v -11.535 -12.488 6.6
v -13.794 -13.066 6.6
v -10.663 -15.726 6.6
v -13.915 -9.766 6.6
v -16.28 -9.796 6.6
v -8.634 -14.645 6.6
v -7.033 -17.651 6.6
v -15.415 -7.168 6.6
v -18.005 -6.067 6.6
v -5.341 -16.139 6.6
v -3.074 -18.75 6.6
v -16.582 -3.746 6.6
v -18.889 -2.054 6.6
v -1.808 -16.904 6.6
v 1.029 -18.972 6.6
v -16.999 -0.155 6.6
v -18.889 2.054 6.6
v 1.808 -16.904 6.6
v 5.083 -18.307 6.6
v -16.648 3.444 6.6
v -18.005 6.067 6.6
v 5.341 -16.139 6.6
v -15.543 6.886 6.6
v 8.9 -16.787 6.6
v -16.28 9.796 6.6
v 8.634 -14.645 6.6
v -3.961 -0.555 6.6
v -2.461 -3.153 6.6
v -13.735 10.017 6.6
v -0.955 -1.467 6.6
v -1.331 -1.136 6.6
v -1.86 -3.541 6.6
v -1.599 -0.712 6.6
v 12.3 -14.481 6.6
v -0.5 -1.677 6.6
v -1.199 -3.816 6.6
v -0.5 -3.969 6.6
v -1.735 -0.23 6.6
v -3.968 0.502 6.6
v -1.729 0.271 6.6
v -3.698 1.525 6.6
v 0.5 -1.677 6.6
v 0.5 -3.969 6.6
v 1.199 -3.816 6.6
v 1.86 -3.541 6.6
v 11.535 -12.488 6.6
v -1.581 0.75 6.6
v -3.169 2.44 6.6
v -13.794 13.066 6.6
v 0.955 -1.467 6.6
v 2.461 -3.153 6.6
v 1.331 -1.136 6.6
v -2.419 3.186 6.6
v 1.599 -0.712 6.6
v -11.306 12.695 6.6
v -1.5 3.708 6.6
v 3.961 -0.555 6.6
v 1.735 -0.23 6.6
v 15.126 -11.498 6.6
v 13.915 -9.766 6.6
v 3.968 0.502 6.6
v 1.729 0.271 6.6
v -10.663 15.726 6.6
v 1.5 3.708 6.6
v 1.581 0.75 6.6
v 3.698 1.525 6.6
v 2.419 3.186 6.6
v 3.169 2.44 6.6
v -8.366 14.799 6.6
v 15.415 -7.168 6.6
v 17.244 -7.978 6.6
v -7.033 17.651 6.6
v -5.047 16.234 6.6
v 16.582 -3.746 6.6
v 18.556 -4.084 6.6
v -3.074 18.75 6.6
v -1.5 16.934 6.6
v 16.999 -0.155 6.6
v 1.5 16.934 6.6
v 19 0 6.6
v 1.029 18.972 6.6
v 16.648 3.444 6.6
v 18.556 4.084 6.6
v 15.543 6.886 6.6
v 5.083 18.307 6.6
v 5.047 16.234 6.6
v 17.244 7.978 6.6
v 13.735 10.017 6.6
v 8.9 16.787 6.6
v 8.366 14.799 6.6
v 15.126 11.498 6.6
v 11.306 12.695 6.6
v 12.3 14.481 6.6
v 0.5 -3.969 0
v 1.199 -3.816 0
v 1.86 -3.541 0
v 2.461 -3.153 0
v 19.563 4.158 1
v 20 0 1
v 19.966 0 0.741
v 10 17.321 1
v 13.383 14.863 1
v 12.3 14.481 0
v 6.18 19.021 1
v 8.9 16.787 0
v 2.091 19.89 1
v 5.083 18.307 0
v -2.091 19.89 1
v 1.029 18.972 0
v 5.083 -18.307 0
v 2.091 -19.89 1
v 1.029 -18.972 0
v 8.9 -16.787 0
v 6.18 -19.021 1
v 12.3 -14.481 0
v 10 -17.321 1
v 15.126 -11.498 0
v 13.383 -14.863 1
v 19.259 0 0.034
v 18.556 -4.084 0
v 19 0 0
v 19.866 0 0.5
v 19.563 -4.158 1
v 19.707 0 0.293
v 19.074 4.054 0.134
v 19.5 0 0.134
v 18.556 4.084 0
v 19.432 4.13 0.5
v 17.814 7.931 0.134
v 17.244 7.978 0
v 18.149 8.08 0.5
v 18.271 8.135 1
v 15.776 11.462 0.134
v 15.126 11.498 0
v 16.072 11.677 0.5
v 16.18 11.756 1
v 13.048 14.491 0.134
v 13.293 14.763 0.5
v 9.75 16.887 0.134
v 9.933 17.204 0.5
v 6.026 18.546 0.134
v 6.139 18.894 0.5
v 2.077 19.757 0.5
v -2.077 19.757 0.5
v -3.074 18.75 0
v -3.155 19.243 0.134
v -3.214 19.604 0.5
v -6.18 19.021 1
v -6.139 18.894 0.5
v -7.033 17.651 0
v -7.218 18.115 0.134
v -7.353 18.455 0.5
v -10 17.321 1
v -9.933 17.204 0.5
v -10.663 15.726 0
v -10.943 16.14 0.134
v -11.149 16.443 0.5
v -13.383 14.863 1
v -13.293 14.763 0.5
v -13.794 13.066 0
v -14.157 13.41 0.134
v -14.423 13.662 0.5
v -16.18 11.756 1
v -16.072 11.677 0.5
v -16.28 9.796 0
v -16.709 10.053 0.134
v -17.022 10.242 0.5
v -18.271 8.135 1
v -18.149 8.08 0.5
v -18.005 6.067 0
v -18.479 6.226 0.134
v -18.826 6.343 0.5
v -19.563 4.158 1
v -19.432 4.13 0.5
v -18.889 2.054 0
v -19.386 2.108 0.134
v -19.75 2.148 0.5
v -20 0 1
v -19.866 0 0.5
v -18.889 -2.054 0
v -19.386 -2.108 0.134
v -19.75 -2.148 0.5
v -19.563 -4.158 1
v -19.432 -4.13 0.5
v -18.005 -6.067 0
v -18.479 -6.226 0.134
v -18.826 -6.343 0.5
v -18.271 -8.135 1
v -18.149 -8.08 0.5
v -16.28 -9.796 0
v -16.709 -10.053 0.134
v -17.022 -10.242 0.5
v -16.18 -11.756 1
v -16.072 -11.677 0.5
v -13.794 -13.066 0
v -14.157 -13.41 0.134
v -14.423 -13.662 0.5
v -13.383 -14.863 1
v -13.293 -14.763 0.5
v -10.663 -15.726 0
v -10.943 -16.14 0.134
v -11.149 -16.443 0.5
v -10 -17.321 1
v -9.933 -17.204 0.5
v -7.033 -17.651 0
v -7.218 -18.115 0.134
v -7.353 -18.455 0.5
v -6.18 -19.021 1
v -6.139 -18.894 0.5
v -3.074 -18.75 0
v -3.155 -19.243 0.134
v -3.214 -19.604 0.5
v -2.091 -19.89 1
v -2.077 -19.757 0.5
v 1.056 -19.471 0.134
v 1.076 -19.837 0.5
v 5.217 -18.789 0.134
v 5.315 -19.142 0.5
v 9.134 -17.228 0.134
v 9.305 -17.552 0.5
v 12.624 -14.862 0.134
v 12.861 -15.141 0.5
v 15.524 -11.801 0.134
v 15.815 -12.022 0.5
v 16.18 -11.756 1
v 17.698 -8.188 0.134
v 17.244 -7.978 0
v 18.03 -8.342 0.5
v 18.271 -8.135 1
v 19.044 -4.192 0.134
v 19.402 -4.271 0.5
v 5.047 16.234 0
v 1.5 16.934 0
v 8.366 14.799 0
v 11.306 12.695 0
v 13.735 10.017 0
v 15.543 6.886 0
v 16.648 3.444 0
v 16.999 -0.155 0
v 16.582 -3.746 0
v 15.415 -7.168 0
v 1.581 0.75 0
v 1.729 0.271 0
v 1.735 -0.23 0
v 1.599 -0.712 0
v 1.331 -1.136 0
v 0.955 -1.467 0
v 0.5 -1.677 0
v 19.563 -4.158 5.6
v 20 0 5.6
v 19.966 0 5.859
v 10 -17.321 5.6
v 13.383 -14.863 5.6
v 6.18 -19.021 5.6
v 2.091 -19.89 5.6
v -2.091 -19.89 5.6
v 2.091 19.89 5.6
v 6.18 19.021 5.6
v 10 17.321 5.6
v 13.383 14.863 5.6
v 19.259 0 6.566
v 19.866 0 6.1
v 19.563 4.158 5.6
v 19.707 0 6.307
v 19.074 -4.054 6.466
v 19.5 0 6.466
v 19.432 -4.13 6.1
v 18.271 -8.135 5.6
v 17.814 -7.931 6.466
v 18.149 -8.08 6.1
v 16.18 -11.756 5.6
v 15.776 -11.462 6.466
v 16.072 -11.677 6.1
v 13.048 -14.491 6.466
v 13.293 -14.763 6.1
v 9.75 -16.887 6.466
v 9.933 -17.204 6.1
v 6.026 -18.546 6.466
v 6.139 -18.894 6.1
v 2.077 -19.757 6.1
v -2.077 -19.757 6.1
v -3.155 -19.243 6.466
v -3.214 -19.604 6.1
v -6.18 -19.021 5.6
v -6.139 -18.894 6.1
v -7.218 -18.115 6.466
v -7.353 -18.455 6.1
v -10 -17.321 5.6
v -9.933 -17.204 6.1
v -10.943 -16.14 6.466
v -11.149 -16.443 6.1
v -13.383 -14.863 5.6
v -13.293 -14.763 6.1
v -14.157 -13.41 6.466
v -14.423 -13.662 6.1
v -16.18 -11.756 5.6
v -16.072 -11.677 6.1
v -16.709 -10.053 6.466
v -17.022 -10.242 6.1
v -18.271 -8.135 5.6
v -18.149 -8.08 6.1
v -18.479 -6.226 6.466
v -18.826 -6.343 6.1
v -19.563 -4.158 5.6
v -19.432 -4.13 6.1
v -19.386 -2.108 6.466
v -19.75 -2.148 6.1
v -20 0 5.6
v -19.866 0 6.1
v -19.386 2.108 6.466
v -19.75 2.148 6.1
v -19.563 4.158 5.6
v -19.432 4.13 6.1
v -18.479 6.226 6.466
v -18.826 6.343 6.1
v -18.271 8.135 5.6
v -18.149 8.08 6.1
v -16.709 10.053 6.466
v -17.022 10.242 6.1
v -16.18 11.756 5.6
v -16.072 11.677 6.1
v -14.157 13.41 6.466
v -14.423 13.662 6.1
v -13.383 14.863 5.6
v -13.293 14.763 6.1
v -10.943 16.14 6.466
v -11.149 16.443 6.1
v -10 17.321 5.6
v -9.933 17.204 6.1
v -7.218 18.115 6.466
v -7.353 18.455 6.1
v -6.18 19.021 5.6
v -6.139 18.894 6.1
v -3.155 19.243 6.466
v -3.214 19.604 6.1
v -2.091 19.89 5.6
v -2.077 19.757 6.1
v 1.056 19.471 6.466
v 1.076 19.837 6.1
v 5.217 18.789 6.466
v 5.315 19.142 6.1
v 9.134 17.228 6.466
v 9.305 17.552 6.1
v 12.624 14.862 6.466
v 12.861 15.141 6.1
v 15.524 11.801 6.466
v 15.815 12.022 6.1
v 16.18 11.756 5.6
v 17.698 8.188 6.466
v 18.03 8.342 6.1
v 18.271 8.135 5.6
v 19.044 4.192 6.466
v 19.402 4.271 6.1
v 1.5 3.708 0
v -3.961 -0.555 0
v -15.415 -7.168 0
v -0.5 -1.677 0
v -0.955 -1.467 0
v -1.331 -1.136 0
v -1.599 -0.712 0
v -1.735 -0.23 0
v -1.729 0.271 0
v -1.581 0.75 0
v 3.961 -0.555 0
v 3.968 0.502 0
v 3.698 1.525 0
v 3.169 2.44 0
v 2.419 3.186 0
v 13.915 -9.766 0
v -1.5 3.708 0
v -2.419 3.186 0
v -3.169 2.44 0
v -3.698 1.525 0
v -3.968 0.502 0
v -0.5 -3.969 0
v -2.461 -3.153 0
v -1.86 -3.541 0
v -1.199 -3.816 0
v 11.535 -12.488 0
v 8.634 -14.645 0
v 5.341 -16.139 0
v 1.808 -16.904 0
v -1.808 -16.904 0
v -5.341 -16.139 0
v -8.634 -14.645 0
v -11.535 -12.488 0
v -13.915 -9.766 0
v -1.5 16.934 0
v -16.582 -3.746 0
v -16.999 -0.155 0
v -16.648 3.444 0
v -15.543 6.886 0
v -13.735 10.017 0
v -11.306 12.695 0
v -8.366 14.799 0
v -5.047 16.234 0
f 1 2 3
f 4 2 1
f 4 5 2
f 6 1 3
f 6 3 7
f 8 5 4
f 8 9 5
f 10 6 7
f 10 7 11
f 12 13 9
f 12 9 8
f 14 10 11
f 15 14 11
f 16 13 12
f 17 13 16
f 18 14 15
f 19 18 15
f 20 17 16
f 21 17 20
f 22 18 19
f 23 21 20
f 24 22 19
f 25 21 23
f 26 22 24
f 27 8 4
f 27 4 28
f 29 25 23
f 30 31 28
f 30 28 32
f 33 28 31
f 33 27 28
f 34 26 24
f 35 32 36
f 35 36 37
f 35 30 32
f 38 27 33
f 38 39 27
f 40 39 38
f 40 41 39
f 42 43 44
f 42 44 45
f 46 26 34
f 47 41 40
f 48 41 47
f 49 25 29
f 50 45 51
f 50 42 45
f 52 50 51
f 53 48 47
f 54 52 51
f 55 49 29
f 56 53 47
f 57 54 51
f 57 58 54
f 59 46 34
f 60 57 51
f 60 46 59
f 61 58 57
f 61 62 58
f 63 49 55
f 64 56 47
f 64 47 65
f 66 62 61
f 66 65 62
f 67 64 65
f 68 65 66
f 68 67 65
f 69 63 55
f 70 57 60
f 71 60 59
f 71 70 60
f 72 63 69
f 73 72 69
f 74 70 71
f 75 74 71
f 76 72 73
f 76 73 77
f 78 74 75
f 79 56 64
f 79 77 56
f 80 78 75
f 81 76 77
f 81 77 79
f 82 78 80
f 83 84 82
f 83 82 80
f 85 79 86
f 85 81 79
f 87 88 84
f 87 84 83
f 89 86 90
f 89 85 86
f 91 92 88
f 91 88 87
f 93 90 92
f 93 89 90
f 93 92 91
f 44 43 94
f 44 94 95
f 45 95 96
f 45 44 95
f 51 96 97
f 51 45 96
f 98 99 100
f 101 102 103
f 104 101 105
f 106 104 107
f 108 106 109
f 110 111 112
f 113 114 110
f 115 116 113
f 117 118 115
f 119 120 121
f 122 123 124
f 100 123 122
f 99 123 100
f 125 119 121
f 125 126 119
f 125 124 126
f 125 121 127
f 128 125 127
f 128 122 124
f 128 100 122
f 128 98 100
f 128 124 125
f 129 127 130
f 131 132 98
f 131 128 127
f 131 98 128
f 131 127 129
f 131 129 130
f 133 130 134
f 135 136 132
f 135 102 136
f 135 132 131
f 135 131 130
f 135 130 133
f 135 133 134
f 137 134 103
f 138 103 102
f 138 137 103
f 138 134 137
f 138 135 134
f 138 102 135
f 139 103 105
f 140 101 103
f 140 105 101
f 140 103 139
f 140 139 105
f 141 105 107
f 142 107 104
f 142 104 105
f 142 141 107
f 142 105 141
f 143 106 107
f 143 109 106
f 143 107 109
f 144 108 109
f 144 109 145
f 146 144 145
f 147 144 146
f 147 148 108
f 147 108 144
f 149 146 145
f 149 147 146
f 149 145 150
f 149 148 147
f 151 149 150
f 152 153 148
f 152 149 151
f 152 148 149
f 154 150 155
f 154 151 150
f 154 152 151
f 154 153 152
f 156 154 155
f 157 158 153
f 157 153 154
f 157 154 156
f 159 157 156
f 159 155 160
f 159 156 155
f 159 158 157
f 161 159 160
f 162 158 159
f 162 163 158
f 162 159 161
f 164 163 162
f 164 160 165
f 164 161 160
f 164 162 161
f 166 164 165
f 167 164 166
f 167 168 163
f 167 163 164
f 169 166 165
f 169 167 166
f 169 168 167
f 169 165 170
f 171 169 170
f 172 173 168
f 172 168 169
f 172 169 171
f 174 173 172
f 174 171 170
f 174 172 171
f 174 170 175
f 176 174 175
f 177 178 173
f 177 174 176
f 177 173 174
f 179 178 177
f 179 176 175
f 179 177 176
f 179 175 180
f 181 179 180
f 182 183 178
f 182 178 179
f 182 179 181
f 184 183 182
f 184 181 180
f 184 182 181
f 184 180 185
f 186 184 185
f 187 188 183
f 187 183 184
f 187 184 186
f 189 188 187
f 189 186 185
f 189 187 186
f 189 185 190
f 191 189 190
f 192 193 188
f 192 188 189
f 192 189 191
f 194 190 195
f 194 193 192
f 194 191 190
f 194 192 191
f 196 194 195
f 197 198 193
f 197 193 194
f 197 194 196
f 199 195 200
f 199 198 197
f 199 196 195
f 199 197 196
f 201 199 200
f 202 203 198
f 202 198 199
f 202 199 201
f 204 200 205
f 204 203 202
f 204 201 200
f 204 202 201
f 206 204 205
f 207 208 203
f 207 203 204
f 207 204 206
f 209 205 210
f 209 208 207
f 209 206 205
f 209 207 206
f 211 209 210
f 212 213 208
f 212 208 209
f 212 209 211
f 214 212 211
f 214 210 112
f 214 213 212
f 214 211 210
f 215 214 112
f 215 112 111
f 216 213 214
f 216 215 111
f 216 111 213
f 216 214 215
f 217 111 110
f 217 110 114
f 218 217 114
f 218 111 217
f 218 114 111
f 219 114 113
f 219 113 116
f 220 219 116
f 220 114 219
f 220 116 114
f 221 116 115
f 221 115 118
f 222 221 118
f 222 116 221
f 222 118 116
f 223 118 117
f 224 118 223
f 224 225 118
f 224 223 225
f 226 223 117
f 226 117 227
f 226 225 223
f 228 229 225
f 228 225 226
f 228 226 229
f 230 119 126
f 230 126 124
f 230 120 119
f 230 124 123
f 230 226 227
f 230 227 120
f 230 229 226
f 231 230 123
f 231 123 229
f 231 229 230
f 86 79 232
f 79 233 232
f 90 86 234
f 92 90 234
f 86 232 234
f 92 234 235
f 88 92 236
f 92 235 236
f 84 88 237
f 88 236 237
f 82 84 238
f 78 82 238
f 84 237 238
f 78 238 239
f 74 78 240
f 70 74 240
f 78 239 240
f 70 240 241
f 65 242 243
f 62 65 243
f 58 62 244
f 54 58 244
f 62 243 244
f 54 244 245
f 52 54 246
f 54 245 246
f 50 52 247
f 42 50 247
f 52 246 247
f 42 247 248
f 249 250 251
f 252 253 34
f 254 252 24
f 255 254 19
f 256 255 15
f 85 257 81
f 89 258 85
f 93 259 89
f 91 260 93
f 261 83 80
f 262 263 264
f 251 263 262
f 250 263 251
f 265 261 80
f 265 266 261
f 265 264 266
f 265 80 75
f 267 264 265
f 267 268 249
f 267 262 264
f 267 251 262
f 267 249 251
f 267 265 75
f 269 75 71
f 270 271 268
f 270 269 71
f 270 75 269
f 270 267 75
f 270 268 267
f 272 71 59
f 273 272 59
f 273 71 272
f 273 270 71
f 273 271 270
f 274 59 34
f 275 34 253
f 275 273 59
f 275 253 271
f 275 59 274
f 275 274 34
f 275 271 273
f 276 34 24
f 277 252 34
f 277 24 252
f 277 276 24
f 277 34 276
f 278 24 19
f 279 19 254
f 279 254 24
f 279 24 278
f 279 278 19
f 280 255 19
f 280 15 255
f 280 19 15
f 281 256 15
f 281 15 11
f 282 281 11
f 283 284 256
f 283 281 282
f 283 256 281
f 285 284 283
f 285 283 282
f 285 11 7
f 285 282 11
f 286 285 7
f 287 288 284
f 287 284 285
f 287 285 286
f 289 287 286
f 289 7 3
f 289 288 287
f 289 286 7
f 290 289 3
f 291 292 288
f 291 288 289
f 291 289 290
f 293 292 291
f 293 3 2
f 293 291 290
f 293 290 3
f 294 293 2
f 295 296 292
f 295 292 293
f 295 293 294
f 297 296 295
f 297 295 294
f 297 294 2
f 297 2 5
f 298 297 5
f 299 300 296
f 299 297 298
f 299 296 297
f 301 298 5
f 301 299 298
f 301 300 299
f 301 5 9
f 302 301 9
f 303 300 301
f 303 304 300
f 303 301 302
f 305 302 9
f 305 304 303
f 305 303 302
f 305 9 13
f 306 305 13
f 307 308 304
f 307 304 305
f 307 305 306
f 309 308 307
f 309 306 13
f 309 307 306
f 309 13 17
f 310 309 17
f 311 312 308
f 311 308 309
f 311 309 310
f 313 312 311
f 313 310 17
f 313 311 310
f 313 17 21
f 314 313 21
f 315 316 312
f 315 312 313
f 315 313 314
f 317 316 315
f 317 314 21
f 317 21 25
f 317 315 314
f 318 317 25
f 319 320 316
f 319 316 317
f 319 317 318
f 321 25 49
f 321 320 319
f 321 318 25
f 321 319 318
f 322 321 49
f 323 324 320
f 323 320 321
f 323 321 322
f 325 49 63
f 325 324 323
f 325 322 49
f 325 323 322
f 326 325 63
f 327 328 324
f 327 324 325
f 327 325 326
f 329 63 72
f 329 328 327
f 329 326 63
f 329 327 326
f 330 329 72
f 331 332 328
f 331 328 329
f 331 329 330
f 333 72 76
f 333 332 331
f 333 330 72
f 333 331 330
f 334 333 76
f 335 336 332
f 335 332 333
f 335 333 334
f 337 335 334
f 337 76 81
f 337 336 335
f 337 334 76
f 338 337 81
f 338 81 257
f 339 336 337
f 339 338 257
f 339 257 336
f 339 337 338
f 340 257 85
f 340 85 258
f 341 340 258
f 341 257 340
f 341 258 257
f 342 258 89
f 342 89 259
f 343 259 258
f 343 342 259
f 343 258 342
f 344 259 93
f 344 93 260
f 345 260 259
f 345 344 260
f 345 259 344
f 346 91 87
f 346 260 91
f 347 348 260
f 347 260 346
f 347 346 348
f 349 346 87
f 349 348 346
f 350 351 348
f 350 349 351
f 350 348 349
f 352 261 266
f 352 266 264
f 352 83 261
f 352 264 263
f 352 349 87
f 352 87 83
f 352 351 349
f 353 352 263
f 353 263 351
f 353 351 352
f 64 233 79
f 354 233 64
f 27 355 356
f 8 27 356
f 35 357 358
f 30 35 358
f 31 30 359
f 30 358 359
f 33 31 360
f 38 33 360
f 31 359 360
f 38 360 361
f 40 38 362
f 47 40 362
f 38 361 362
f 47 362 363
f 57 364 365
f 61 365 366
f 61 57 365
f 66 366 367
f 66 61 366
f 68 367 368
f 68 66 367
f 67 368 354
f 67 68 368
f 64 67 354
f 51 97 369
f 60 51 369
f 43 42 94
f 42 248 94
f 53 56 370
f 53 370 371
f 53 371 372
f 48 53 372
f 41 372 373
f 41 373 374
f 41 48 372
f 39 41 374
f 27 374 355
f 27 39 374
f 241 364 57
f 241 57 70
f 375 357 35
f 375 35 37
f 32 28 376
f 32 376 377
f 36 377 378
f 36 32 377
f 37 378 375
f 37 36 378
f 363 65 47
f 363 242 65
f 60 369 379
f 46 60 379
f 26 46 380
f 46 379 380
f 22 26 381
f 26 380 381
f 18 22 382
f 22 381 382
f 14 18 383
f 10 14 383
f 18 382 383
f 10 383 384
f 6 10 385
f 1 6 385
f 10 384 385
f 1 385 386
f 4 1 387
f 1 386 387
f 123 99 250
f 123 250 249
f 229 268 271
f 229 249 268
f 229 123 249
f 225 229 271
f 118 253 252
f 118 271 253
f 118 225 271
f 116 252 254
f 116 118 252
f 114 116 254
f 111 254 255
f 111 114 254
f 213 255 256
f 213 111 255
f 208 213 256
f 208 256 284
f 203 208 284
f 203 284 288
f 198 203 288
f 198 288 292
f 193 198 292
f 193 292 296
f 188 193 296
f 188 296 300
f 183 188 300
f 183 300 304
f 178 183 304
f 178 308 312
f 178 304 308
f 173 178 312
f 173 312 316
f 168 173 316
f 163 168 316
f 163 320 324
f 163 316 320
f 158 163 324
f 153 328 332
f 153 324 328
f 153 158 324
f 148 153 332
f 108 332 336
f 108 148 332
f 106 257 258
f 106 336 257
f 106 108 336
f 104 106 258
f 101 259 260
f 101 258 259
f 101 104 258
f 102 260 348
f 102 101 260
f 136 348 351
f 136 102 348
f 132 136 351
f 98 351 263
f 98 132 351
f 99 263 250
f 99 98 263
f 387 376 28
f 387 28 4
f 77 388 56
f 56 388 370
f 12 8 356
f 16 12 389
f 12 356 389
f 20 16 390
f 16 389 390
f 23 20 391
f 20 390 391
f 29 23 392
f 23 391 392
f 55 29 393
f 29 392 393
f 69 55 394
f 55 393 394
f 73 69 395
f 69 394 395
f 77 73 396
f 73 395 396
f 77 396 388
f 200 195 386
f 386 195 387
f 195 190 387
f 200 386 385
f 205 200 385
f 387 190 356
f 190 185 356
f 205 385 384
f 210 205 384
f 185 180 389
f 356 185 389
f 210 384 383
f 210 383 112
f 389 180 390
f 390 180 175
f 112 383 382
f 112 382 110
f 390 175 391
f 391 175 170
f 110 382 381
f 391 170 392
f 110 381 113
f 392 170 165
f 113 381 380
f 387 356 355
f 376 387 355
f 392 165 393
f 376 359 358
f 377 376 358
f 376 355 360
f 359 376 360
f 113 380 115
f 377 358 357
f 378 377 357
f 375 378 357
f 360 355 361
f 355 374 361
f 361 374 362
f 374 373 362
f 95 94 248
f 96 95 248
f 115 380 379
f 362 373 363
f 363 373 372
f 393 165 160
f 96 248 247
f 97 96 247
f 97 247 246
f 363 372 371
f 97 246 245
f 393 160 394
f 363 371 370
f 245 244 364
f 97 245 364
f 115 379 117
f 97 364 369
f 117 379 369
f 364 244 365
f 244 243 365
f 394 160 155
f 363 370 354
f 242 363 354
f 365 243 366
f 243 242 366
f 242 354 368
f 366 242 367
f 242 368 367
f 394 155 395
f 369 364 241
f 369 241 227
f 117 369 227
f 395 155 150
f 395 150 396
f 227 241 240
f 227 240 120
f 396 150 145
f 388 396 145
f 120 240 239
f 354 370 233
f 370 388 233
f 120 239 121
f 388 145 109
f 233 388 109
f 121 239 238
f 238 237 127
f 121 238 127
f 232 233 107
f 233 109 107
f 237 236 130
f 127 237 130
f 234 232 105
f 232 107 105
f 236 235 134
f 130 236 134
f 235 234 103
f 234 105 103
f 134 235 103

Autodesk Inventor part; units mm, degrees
ref_plane "YZ Plane" through (0, 0, 0) normal (1, 0, 0) x (0, 1, 0)
ref_plane "XZ Plane" through (0, 0, 0) normal (0, 1, 0) x (-1, 0, 0)
ref_plane "XY Plane" through (0, 0, 0) normal (0, 0, 1) x (1, 0, 0)
sketch "Sketch1" plane through (0, 0, 0) normal (0, 0, 1) x (1, 0, 0)
  circle A0 centre (0, 0) radius 20
  dimension "d0" = 40
extrude "Extrusion1" add sketch "Sketch1" along normal blind 6.6
sketch "Sketch3" plane through (0, 0, 0) normal (0, 0, -1) x (-1, 0, 0)
  circle A0 centre (0, 0) radius 17
  line L0 (0, 17) -> (0, 0)
  line L1 (0, 0) -> (14.7224, -8.5)
  line L2 (0, 0) -> (-14.7224, -8.5)
  line L3 (0, 0) -> (17, 0) construction
  line L4 (1.5, 16.9337) -> (1.5, 0.866)
  line L5 (-1.5, 16.9337) -> (-1.5, 0.866)
  line L6 (-1.5, 0.866) -> (-15.415, -7.1678)
  line L7 (0, -1.7321) -> (-13.915, -9.7659)
  line L8 (1.5, 0.866) -> (15.415, -7.1678)
  line L9 (0, -1.7321) -> (13.915, -9.7659)
  dimension "d6" = 34
  dimension "d7" = 120
  dimension "d8" = 150
  dimension "d9" = 1.5
  dimension "d10" = 1.5
  dimension "d11" = 1.5
  dimension "d12" = 1.5
  dimension "d13" = 1.5
  dimension "d14" = 1.5
extrude "Extrusion3" cut sketch "Sketch3" against normal up to surface (6.6 mm away) contours A0 L8 L4 | L5 L6 A0 | A0 L7 L9
sketch "Sketch5" plane through (0, 0, 6.6) normal (0, 0, 1) x (1, 0, 0)
  circle A0 centre (0, 0) radius 4
  dimension "d20" = 8
extrude "Extrusion5" add sketch "Sketch5" against normal blind 6.6
sketch "Sketch6" plane through (0, 0, 0) normal (0, 0, -1) x (-1, 0, 0)
  circle A0 centre (0, 0) radius 1.75
  line L0 (0, -1.75) -> (0, -4)
  arc A1 (-2.4613, -3.1531) -> (2.4613, -3.1531) centre (0, 0) ccw projected
  line L1 (0.5, -1.6771) -> (0.5, -3.9686)
  line L2 (-0.5, -1.6771) -> (-0.5, -3.9686)
  line L3 (-1.5811, 0.75) -> (1.5811, 0.75)
  point P0 (0.0845, 0.75)
  dimension "d23" = 3.5
  dimension "d24" = 0.5
  dimension "d25" = 0.5
  dimension "d29" = 2.5
extrude "Extrusion6" cut sketch "Sketch6" against normal up to surface (6.6 mm away) contours A0 L3 | L1 A1 L0 A0 | L0 A1 L2 A0 picked at (0, -0.0833)
fillet "Arredondamento1" radius 1 2 edges at (-20, 0, 6.6) (-20, 0, 0)
properties part number "wheel"
